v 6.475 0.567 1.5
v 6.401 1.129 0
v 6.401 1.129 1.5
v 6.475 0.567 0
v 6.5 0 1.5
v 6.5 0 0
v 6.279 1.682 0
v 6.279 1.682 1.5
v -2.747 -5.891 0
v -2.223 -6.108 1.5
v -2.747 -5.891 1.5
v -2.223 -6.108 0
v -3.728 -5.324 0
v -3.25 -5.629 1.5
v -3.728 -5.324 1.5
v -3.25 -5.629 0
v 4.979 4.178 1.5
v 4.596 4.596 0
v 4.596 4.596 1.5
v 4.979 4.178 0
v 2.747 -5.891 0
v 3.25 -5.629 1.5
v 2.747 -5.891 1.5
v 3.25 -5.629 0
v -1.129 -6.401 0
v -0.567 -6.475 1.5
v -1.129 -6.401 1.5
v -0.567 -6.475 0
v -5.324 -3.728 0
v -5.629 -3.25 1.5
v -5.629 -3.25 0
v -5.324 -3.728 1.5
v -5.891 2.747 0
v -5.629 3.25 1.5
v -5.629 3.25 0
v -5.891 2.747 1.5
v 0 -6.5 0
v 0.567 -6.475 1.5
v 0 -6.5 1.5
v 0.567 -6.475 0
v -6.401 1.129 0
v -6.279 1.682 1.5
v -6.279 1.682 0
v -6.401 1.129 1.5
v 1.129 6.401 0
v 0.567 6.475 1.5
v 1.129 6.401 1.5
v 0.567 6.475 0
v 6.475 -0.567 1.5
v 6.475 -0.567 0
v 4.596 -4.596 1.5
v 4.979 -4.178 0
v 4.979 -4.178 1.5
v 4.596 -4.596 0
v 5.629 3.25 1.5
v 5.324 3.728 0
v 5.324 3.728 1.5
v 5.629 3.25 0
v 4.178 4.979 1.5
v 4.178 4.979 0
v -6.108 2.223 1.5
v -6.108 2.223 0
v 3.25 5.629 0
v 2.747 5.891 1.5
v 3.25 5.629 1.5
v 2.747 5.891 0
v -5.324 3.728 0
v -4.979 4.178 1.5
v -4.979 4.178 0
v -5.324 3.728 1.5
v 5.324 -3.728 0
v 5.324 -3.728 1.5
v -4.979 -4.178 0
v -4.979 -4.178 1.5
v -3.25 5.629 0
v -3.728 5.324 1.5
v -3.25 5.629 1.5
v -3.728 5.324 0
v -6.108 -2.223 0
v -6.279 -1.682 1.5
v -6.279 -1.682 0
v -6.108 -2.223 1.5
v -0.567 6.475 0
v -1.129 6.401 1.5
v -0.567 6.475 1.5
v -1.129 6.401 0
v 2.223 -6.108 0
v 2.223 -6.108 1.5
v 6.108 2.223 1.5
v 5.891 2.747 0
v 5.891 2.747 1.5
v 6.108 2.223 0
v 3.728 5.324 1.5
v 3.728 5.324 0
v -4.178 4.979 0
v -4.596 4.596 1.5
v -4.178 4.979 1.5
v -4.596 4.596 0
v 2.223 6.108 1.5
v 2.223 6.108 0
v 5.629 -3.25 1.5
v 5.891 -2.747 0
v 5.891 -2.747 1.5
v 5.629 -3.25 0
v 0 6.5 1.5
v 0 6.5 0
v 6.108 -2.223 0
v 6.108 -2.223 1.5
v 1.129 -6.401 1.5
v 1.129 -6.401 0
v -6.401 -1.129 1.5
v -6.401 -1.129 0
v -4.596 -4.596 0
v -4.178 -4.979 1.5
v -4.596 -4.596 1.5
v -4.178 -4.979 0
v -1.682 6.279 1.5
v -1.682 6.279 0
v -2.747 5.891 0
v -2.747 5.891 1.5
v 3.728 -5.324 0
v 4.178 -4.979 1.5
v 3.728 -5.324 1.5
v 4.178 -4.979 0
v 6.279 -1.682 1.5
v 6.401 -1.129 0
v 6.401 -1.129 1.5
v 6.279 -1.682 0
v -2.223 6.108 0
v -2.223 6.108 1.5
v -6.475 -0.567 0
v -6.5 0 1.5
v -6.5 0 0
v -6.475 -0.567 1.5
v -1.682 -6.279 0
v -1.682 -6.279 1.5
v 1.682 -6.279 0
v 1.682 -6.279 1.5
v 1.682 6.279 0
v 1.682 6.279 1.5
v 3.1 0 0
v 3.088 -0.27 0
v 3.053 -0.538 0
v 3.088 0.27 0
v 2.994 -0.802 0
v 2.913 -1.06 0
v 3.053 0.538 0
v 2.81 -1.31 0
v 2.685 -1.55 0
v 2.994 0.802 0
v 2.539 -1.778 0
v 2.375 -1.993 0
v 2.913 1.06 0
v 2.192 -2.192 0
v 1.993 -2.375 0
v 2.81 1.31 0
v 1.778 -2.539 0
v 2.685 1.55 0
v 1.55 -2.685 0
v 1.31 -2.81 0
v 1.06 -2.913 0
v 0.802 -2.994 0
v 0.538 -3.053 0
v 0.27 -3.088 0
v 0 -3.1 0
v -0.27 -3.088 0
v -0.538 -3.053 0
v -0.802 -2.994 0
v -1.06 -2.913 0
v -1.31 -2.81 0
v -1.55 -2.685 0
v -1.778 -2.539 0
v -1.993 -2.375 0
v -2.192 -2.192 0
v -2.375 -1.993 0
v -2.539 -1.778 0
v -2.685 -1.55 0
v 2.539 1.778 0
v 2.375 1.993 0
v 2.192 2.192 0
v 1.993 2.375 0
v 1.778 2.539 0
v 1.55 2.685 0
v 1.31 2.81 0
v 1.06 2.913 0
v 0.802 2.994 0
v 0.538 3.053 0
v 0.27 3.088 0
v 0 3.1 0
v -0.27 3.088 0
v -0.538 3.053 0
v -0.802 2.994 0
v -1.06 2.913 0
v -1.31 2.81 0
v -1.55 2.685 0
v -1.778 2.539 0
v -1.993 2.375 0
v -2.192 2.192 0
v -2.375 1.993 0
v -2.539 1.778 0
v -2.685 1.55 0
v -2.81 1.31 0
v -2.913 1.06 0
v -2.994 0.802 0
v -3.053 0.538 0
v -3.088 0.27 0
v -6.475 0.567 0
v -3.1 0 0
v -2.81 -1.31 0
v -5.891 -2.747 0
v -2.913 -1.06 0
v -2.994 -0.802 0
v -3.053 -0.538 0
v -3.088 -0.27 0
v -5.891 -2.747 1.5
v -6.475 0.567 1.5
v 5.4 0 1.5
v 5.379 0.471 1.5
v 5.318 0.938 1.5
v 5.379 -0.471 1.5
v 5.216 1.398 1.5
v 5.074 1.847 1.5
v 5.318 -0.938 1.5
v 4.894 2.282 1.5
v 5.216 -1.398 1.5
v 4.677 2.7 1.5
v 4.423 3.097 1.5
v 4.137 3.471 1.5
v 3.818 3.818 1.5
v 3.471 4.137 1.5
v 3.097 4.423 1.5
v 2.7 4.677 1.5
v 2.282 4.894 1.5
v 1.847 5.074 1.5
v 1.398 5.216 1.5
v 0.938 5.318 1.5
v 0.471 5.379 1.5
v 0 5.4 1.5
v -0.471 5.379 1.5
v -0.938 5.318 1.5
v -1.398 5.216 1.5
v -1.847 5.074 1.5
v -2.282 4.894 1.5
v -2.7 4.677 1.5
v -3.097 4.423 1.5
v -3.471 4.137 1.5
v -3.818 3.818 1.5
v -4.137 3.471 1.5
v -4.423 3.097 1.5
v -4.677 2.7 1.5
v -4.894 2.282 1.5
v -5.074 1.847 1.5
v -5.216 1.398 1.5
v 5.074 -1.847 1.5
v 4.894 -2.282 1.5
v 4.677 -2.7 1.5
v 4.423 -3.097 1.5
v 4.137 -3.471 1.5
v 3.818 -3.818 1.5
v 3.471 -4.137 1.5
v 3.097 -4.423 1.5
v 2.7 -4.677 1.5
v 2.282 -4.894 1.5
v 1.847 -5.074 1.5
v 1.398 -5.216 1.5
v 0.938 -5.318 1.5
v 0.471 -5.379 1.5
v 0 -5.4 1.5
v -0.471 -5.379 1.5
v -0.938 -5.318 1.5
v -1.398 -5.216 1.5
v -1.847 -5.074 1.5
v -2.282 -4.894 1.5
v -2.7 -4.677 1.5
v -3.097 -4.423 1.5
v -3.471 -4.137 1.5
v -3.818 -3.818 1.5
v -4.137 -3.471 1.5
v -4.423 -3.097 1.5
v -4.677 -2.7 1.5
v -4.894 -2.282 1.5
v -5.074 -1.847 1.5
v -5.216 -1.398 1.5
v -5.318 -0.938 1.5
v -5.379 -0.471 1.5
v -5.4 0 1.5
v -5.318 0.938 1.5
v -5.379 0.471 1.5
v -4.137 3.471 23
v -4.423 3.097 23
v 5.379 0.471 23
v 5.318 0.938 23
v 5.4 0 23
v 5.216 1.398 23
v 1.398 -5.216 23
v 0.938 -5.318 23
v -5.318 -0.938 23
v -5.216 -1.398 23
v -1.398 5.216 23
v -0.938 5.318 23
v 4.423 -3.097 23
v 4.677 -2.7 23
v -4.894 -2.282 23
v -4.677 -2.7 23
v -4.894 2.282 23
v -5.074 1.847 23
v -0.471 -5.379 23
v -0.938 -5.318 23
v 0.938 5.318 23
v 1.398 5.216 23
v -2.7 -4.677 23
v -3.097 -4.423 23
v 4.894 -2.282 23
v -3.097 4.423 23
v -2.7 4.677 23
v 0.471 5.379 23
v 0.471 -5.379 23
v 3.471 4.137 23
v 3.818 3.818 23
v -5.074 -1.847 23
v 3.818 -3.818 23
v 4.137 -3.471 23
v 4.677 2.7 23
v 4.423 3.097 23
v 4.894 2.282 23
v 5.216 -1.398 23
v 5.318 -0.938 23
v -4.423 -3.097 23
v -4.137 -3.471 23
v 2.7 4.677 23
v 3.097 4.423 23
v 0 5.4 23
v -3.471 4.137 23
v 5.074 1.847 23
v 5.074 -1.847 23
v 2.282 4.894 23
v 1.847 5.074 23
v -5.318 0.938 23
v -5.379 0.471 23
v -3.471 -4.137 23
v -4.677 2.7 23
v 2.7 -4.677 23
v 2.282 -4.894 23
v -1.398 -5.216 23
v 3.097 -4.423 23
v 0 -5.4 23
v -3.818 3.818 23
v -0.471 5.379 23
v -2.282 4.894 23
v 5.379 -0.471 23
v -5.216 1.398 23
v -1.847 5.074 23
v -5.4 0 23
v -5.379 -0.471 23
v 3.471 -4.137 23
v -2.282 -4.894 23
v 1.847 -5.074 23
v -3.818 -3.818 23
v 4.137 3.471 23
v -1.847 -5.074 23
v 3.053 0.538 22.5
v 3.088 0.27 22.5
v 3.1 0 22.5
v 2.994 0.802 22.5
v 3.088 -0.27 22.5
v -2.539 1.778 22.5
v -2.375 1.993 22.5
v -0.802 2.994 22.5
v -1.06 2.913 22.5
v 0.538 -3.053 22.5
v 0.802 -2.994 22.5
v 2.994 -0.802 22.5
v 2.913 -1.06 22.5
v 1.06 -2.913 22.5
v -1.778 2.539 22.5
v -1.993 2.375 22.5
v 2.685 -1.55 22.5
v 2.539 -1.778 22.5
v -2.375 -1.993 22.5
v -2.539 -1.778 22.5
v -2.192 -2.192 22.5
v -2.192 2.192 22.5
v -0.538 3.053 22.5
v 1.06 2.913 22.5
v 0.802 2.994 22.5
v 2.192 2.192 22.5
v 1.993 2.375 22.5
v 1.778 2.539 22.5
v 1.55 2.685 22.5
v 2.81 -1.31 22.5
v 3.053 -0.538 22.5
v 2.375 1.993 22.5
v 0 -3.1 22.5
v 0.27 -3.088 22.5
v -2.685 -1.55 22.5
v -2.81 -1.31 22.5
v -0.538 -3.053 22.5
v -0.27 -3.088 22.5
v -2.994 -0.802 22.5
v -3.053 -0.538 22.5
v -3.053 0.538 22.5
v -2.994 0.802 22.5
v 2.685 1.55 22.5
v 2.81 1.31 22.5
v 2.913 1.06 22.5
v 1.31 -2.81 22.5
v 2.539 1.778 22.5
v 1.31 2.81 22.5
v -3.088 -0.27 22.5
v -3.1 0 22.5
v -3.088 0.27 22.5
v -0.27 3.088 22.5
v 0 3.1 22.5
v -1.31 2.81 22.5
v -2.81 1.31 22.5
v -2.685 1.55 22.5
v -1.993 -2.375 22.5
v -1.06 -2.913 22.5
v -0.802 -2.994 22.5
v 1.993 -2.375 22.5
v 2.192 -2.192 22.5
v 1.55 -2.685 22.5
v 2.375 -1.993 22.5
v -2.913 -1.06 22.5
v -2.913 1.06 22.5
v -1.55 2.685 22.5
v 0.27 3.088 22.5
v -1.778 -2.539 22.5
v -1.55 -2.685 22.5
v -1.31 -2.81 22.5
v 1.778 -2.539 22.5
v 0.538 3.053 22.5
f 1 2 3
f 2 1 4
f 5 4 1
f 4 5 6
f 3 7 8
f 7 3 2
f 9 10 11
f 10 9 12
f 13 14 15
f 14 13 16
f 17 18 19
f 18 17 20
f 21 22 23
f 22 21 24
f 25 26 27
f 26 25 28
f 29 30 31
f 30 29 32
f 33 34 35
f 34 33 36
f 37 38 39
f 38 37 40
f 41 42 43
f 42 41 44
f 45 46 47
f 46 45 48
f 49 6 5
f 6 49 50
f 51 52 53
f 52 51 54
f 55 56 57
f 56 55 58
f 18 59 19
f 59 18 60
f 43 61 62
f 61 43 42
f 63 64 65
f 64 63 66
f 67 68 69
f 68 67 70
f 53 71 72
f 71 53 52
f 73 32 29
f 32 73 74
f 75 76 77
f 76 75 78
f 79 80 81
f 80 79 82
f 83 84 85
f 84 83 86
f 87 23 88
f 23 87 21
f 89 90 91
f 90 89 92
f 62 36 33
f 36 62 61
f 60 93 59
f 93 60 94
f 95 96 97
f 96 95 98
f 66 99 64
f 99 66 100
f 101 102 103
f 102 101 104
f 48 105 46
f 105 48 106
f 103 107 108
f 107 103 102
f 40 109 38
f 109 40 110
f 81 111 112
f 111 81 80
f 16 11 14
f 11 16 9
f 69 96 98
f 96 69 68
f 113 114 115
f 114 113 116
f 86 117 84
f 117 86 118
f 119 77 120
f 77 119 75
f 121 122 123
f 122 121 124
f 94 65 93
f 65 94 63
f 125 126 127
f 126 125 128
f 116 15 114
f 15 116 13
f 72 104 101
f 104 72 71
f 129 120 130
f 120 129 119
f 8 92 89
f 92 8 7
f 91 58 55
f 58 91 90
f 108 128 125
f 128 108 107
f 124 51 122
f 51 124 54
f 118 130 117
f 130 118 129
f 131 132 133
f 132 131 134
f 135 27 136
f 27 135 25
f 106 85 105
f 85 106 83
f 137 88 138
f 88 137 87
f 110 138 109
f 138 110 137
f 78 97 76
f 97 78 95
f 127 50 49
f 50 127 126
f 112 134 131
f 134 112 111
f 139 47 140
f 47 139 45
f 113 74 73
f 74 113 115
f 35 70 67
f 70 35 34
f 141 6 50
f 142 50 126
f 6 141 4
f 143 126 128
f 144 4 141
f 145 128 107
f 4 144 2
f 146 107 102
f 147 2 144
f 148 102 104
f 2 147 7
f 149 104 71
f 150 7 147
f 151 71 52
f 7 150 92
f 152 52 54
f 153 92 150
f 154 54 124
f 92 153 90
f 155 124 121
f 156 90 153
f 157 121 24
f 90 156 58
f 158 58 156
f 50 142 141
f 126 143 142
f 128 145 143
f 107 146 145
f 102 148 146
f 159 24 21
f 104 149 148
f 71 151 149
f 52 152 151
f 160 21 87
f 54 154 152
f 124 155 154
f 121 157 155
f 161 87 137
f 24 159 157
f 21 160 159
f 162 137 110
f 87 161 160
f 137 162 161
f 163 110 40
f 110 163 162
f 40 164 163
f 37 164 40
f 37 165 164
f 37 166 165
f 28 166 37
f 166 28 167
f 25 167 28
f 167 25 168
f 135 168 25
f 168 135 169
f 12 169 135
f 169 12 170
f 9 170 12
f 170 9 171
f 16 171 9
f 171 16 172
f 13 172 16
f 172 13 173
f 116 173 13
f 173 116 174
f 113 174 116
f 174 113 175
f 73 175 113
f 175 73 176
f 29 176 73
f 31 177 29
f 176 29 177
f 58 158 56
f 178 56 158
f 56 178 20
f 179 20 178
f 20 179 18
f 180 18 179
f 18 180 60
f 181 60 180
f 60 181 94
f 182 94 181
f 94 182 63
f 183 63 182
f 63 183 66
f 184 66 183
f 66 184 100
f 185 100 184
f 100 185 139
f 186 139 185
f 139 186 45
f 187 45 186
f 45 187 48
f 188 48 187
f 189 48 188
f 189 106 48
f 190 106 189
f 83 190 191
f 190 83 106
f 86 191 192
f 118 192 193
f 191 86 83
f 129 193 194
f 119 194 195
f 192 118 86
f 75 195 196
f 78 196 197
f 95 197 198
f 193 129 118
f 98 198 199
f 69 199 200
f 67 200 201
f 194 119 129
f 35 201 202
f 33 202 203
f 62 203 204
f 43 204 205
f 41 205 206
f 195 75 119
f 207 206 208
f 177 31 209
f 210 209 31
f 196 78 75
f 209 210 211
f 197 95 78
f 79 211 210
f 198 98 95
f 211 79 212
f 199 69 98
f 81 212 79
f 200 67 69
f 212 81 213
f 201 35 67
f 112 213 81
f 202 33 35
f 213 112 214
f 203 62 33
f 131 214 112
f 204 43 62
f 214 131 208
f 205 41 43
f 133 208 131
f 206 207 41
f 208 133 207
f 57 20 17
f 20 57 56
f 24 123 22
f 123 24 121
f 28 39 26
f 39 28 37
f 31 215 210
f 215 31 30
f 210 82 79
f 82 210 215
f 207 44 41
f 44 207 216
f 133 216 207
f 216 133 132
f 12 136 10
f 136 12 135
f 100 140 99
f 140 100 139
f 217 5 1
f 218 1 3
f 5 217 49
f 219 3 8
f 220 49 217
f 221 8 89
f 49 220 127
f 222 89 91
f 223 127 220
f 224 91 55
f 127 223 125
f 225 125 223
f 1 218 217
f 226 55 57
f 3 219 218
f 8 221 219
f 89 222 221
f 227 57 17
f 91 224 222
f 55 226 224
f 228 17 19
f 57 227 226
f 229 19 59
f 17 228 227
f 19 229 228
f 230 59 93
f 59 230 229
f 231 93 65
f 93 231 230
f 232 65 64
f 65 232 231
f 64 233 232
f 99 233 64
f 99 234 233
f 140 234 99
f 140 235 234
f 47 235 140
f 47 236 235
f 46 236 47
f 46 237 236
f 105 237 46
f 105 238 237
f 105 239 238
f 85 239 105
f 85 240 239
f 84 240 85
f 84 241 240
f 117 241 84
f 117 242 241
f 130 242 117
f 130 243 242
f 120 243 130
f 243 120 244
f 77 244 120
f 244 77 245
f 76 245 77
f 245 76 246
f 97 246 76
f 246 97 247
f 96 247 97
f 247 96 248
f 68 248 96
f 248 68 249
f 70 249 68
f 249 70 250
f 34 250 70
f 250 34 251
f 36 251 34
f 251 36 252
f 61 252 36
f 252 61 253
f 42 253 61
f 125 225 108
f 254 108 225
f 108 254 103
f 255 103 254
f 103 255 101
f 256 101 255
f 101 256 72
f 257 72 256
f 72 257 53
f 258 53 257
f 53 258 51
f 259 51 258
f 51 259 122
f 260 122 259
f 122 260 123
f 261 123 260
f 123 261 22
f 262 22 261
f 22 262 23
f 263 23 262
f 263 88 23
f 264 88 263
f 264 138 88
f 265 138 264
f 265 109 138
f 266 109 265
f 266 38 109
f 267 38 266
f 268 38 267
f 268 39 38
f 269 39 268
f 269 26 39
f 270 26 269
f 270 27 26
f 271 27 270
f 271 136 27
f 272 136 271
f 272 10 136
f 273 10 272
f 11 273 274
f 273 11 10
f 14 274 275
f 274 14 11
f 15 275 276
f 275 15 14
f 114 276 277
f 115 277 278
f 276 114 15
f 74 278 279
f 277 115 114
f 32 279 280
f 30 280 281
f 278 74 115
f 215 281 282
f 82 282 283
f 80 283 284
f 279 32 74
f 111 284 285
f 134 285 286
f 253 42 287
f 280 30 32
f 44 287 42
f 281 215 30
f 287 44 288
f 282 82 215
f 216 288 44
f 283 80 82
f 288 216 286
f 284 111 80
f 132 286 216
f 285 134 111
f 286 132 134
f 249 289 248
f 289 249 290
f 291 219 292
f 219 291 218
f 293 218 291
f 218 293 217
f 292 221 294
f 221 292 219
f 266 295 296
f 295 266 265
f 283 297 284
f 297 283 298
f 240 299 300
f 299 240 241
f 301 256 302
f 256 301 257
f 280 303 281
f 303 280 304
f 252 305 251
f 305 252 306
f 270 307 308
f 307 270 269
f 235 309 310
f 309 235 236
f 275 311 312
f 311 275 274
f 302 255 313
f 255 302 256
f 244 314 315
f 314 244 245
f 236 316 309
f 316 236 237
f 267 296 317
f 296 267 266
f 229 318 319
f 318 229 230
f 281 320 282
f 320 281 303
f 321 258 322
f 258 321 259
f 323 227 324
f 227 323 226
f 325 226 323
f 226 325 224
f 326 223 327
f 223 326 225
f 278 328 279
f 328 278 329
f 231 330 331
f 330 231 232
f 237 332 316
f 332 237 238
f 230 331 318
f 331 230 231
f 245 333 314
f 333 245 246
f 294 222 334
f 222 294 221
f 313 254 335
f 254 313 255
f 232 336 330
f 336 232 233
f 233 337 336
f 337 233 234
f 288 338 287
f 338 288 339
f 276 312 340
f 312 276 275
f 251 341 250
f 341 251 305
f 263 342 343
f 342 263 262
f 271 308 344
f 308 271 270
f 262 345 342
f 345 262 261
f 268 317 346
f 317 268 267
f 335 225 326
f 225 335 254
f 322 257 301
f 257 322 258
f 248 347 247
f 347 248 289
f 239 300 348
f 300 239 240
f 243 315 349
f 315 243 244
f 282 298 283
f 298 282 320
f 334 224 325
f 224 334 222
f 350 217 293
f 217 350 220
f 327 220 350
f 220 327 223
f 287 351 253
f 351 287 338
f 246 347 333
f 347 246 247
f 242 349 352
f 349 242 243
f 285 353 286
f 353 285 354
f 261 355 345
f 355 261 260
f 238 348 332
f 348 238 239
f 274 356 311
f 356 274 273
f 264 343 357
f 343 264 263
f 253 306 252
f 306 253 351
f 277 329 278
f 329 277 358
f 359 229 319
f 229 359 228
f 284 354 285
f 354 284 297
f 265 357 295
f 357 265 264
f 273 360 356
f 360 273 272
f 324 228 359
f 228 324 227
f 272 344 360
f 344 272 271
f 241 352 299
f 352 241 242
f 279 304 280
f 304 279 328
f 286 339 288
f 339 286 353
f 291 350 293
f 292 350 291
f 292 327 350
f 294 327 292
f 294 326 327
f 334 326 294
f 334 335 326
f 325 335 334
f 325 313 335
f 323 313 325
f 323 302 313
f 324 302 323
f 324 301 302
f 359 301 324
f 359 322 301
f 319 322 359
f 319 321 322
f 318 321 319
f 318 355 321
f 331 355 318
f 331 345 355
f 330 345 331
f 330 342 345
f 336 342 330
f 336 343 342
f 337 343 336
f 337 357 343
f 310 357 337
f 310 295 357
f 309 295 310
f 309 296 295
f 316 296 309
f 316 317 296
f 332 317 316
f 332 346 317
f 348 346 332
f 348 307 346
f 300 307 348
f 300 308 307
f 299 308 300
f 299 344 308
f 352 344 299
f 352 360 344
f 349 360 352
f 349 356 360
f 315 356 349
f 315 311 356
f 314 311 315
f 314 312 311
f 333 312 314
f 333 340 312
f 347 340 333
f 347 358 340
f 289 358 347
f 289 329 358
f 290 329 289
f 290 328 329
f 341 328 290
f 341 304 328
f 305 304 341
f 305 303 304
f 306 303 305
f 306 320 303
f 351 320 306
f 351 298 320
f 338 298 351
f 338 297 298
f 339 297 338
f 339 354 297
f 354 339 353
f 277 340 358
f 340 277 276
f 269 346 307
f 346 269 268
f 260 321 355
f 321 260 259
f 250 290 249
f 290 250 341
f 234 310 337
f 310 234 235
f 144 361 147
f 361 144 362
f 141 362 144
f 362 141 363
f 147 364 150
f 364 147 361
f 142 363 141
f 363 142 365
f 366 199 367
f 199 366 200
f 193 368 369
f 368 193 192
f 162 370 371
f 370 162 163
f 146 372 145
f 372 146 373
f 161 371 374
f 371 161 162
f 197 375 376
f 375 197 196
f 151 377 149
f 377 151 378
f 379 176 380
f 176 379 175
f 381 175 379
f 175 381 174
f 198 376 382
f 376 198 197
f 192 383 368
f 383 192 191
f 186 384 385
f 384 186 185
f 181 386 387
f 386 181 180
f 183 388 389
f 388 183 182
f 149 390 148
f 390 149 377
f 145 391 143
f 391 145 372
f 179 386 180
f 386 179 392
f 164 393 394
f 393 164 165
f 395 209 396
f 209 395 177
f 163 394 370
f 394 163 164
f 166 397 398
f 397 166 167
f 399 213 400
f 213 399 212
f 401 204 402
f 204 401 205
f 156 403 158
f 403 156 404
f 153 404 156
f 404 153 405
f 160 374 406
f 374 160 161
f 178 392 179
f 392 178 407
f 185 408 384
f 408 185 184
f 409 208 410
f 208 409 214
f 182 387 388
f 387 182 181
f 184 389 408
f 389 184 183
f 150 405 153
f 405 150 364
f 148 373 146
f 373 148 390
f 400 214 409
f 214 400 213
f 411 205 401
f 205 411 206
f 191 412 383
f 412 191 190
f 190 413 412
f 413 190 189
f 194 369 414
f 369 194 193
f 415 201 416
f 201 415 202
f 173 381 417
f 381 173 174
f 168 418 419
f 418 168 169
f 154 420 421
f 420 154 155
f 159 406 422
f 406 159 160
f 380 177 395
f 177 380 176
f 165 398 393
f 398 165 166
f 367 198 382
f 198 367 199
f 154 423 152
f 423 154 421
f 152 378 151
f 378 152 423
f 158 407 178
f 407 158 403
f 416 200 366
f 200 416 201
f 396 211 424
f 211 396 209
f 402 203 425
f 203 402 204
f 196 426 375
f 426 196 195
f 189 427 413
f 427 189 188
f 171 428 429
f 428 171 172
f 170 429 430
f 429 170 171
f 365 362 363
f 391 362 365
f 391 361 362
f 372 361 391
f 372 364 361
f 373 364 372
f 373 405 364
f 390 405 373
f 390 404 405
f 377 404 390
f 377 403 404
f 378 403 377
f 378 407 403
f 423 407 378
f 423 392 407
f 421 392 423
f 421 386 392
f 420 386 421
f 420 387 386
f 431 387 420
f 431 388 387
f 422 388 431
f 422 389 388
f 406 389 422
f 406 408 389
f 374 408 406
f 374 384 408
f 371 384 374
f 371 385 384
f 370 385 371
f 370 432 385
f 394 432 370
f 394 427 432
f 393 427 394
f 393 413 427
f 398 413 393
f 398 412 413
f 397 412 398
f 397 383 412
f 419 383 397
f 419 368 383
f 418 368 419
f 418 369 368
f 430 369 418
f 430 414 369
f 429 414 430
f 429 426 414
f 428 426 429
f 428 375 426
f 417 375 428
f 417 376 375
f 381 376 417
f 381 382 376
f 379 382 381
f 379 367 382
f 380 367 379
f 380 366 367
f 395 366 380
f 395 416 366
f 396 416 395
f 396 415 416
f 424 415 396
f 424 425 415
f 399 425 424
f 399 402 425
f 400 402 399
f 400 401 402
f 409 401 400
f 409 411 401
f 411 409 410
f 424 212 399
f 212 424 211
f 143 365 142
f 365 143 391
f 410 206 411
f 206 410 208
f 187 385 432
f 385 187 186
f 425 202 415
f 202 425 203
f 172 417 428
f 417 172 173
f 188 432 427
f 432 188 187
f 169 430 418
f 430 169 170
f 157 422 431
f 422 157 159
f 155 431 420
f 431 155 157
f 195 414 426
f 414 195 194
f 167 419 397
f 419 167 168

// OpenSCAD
// Adapter sleeve - a collar with a sleeve body that lines a 1.5 mL tube rack hole to
// hold a 0.2 mL PCR tube. Printed upside down: the collar lies on the bed and the
// sleeve body rises above it. A through-bore open at both ends.
//

collar_d  = 13;
collar_h  = 1.5;
body_d    = 10.8;
body_h    = 21.5;
bore      = 6.2;

$fn = 72;

difference() {
    union() {
        cylinder(h = collar_h, d = collar_d);
        translate([0, 0, collar_h]) cylinder(h = body_h, d = body_d);
    }
    translate([0, 0, -1]) cylinder(h = body_h + 2, d = bore);
}
